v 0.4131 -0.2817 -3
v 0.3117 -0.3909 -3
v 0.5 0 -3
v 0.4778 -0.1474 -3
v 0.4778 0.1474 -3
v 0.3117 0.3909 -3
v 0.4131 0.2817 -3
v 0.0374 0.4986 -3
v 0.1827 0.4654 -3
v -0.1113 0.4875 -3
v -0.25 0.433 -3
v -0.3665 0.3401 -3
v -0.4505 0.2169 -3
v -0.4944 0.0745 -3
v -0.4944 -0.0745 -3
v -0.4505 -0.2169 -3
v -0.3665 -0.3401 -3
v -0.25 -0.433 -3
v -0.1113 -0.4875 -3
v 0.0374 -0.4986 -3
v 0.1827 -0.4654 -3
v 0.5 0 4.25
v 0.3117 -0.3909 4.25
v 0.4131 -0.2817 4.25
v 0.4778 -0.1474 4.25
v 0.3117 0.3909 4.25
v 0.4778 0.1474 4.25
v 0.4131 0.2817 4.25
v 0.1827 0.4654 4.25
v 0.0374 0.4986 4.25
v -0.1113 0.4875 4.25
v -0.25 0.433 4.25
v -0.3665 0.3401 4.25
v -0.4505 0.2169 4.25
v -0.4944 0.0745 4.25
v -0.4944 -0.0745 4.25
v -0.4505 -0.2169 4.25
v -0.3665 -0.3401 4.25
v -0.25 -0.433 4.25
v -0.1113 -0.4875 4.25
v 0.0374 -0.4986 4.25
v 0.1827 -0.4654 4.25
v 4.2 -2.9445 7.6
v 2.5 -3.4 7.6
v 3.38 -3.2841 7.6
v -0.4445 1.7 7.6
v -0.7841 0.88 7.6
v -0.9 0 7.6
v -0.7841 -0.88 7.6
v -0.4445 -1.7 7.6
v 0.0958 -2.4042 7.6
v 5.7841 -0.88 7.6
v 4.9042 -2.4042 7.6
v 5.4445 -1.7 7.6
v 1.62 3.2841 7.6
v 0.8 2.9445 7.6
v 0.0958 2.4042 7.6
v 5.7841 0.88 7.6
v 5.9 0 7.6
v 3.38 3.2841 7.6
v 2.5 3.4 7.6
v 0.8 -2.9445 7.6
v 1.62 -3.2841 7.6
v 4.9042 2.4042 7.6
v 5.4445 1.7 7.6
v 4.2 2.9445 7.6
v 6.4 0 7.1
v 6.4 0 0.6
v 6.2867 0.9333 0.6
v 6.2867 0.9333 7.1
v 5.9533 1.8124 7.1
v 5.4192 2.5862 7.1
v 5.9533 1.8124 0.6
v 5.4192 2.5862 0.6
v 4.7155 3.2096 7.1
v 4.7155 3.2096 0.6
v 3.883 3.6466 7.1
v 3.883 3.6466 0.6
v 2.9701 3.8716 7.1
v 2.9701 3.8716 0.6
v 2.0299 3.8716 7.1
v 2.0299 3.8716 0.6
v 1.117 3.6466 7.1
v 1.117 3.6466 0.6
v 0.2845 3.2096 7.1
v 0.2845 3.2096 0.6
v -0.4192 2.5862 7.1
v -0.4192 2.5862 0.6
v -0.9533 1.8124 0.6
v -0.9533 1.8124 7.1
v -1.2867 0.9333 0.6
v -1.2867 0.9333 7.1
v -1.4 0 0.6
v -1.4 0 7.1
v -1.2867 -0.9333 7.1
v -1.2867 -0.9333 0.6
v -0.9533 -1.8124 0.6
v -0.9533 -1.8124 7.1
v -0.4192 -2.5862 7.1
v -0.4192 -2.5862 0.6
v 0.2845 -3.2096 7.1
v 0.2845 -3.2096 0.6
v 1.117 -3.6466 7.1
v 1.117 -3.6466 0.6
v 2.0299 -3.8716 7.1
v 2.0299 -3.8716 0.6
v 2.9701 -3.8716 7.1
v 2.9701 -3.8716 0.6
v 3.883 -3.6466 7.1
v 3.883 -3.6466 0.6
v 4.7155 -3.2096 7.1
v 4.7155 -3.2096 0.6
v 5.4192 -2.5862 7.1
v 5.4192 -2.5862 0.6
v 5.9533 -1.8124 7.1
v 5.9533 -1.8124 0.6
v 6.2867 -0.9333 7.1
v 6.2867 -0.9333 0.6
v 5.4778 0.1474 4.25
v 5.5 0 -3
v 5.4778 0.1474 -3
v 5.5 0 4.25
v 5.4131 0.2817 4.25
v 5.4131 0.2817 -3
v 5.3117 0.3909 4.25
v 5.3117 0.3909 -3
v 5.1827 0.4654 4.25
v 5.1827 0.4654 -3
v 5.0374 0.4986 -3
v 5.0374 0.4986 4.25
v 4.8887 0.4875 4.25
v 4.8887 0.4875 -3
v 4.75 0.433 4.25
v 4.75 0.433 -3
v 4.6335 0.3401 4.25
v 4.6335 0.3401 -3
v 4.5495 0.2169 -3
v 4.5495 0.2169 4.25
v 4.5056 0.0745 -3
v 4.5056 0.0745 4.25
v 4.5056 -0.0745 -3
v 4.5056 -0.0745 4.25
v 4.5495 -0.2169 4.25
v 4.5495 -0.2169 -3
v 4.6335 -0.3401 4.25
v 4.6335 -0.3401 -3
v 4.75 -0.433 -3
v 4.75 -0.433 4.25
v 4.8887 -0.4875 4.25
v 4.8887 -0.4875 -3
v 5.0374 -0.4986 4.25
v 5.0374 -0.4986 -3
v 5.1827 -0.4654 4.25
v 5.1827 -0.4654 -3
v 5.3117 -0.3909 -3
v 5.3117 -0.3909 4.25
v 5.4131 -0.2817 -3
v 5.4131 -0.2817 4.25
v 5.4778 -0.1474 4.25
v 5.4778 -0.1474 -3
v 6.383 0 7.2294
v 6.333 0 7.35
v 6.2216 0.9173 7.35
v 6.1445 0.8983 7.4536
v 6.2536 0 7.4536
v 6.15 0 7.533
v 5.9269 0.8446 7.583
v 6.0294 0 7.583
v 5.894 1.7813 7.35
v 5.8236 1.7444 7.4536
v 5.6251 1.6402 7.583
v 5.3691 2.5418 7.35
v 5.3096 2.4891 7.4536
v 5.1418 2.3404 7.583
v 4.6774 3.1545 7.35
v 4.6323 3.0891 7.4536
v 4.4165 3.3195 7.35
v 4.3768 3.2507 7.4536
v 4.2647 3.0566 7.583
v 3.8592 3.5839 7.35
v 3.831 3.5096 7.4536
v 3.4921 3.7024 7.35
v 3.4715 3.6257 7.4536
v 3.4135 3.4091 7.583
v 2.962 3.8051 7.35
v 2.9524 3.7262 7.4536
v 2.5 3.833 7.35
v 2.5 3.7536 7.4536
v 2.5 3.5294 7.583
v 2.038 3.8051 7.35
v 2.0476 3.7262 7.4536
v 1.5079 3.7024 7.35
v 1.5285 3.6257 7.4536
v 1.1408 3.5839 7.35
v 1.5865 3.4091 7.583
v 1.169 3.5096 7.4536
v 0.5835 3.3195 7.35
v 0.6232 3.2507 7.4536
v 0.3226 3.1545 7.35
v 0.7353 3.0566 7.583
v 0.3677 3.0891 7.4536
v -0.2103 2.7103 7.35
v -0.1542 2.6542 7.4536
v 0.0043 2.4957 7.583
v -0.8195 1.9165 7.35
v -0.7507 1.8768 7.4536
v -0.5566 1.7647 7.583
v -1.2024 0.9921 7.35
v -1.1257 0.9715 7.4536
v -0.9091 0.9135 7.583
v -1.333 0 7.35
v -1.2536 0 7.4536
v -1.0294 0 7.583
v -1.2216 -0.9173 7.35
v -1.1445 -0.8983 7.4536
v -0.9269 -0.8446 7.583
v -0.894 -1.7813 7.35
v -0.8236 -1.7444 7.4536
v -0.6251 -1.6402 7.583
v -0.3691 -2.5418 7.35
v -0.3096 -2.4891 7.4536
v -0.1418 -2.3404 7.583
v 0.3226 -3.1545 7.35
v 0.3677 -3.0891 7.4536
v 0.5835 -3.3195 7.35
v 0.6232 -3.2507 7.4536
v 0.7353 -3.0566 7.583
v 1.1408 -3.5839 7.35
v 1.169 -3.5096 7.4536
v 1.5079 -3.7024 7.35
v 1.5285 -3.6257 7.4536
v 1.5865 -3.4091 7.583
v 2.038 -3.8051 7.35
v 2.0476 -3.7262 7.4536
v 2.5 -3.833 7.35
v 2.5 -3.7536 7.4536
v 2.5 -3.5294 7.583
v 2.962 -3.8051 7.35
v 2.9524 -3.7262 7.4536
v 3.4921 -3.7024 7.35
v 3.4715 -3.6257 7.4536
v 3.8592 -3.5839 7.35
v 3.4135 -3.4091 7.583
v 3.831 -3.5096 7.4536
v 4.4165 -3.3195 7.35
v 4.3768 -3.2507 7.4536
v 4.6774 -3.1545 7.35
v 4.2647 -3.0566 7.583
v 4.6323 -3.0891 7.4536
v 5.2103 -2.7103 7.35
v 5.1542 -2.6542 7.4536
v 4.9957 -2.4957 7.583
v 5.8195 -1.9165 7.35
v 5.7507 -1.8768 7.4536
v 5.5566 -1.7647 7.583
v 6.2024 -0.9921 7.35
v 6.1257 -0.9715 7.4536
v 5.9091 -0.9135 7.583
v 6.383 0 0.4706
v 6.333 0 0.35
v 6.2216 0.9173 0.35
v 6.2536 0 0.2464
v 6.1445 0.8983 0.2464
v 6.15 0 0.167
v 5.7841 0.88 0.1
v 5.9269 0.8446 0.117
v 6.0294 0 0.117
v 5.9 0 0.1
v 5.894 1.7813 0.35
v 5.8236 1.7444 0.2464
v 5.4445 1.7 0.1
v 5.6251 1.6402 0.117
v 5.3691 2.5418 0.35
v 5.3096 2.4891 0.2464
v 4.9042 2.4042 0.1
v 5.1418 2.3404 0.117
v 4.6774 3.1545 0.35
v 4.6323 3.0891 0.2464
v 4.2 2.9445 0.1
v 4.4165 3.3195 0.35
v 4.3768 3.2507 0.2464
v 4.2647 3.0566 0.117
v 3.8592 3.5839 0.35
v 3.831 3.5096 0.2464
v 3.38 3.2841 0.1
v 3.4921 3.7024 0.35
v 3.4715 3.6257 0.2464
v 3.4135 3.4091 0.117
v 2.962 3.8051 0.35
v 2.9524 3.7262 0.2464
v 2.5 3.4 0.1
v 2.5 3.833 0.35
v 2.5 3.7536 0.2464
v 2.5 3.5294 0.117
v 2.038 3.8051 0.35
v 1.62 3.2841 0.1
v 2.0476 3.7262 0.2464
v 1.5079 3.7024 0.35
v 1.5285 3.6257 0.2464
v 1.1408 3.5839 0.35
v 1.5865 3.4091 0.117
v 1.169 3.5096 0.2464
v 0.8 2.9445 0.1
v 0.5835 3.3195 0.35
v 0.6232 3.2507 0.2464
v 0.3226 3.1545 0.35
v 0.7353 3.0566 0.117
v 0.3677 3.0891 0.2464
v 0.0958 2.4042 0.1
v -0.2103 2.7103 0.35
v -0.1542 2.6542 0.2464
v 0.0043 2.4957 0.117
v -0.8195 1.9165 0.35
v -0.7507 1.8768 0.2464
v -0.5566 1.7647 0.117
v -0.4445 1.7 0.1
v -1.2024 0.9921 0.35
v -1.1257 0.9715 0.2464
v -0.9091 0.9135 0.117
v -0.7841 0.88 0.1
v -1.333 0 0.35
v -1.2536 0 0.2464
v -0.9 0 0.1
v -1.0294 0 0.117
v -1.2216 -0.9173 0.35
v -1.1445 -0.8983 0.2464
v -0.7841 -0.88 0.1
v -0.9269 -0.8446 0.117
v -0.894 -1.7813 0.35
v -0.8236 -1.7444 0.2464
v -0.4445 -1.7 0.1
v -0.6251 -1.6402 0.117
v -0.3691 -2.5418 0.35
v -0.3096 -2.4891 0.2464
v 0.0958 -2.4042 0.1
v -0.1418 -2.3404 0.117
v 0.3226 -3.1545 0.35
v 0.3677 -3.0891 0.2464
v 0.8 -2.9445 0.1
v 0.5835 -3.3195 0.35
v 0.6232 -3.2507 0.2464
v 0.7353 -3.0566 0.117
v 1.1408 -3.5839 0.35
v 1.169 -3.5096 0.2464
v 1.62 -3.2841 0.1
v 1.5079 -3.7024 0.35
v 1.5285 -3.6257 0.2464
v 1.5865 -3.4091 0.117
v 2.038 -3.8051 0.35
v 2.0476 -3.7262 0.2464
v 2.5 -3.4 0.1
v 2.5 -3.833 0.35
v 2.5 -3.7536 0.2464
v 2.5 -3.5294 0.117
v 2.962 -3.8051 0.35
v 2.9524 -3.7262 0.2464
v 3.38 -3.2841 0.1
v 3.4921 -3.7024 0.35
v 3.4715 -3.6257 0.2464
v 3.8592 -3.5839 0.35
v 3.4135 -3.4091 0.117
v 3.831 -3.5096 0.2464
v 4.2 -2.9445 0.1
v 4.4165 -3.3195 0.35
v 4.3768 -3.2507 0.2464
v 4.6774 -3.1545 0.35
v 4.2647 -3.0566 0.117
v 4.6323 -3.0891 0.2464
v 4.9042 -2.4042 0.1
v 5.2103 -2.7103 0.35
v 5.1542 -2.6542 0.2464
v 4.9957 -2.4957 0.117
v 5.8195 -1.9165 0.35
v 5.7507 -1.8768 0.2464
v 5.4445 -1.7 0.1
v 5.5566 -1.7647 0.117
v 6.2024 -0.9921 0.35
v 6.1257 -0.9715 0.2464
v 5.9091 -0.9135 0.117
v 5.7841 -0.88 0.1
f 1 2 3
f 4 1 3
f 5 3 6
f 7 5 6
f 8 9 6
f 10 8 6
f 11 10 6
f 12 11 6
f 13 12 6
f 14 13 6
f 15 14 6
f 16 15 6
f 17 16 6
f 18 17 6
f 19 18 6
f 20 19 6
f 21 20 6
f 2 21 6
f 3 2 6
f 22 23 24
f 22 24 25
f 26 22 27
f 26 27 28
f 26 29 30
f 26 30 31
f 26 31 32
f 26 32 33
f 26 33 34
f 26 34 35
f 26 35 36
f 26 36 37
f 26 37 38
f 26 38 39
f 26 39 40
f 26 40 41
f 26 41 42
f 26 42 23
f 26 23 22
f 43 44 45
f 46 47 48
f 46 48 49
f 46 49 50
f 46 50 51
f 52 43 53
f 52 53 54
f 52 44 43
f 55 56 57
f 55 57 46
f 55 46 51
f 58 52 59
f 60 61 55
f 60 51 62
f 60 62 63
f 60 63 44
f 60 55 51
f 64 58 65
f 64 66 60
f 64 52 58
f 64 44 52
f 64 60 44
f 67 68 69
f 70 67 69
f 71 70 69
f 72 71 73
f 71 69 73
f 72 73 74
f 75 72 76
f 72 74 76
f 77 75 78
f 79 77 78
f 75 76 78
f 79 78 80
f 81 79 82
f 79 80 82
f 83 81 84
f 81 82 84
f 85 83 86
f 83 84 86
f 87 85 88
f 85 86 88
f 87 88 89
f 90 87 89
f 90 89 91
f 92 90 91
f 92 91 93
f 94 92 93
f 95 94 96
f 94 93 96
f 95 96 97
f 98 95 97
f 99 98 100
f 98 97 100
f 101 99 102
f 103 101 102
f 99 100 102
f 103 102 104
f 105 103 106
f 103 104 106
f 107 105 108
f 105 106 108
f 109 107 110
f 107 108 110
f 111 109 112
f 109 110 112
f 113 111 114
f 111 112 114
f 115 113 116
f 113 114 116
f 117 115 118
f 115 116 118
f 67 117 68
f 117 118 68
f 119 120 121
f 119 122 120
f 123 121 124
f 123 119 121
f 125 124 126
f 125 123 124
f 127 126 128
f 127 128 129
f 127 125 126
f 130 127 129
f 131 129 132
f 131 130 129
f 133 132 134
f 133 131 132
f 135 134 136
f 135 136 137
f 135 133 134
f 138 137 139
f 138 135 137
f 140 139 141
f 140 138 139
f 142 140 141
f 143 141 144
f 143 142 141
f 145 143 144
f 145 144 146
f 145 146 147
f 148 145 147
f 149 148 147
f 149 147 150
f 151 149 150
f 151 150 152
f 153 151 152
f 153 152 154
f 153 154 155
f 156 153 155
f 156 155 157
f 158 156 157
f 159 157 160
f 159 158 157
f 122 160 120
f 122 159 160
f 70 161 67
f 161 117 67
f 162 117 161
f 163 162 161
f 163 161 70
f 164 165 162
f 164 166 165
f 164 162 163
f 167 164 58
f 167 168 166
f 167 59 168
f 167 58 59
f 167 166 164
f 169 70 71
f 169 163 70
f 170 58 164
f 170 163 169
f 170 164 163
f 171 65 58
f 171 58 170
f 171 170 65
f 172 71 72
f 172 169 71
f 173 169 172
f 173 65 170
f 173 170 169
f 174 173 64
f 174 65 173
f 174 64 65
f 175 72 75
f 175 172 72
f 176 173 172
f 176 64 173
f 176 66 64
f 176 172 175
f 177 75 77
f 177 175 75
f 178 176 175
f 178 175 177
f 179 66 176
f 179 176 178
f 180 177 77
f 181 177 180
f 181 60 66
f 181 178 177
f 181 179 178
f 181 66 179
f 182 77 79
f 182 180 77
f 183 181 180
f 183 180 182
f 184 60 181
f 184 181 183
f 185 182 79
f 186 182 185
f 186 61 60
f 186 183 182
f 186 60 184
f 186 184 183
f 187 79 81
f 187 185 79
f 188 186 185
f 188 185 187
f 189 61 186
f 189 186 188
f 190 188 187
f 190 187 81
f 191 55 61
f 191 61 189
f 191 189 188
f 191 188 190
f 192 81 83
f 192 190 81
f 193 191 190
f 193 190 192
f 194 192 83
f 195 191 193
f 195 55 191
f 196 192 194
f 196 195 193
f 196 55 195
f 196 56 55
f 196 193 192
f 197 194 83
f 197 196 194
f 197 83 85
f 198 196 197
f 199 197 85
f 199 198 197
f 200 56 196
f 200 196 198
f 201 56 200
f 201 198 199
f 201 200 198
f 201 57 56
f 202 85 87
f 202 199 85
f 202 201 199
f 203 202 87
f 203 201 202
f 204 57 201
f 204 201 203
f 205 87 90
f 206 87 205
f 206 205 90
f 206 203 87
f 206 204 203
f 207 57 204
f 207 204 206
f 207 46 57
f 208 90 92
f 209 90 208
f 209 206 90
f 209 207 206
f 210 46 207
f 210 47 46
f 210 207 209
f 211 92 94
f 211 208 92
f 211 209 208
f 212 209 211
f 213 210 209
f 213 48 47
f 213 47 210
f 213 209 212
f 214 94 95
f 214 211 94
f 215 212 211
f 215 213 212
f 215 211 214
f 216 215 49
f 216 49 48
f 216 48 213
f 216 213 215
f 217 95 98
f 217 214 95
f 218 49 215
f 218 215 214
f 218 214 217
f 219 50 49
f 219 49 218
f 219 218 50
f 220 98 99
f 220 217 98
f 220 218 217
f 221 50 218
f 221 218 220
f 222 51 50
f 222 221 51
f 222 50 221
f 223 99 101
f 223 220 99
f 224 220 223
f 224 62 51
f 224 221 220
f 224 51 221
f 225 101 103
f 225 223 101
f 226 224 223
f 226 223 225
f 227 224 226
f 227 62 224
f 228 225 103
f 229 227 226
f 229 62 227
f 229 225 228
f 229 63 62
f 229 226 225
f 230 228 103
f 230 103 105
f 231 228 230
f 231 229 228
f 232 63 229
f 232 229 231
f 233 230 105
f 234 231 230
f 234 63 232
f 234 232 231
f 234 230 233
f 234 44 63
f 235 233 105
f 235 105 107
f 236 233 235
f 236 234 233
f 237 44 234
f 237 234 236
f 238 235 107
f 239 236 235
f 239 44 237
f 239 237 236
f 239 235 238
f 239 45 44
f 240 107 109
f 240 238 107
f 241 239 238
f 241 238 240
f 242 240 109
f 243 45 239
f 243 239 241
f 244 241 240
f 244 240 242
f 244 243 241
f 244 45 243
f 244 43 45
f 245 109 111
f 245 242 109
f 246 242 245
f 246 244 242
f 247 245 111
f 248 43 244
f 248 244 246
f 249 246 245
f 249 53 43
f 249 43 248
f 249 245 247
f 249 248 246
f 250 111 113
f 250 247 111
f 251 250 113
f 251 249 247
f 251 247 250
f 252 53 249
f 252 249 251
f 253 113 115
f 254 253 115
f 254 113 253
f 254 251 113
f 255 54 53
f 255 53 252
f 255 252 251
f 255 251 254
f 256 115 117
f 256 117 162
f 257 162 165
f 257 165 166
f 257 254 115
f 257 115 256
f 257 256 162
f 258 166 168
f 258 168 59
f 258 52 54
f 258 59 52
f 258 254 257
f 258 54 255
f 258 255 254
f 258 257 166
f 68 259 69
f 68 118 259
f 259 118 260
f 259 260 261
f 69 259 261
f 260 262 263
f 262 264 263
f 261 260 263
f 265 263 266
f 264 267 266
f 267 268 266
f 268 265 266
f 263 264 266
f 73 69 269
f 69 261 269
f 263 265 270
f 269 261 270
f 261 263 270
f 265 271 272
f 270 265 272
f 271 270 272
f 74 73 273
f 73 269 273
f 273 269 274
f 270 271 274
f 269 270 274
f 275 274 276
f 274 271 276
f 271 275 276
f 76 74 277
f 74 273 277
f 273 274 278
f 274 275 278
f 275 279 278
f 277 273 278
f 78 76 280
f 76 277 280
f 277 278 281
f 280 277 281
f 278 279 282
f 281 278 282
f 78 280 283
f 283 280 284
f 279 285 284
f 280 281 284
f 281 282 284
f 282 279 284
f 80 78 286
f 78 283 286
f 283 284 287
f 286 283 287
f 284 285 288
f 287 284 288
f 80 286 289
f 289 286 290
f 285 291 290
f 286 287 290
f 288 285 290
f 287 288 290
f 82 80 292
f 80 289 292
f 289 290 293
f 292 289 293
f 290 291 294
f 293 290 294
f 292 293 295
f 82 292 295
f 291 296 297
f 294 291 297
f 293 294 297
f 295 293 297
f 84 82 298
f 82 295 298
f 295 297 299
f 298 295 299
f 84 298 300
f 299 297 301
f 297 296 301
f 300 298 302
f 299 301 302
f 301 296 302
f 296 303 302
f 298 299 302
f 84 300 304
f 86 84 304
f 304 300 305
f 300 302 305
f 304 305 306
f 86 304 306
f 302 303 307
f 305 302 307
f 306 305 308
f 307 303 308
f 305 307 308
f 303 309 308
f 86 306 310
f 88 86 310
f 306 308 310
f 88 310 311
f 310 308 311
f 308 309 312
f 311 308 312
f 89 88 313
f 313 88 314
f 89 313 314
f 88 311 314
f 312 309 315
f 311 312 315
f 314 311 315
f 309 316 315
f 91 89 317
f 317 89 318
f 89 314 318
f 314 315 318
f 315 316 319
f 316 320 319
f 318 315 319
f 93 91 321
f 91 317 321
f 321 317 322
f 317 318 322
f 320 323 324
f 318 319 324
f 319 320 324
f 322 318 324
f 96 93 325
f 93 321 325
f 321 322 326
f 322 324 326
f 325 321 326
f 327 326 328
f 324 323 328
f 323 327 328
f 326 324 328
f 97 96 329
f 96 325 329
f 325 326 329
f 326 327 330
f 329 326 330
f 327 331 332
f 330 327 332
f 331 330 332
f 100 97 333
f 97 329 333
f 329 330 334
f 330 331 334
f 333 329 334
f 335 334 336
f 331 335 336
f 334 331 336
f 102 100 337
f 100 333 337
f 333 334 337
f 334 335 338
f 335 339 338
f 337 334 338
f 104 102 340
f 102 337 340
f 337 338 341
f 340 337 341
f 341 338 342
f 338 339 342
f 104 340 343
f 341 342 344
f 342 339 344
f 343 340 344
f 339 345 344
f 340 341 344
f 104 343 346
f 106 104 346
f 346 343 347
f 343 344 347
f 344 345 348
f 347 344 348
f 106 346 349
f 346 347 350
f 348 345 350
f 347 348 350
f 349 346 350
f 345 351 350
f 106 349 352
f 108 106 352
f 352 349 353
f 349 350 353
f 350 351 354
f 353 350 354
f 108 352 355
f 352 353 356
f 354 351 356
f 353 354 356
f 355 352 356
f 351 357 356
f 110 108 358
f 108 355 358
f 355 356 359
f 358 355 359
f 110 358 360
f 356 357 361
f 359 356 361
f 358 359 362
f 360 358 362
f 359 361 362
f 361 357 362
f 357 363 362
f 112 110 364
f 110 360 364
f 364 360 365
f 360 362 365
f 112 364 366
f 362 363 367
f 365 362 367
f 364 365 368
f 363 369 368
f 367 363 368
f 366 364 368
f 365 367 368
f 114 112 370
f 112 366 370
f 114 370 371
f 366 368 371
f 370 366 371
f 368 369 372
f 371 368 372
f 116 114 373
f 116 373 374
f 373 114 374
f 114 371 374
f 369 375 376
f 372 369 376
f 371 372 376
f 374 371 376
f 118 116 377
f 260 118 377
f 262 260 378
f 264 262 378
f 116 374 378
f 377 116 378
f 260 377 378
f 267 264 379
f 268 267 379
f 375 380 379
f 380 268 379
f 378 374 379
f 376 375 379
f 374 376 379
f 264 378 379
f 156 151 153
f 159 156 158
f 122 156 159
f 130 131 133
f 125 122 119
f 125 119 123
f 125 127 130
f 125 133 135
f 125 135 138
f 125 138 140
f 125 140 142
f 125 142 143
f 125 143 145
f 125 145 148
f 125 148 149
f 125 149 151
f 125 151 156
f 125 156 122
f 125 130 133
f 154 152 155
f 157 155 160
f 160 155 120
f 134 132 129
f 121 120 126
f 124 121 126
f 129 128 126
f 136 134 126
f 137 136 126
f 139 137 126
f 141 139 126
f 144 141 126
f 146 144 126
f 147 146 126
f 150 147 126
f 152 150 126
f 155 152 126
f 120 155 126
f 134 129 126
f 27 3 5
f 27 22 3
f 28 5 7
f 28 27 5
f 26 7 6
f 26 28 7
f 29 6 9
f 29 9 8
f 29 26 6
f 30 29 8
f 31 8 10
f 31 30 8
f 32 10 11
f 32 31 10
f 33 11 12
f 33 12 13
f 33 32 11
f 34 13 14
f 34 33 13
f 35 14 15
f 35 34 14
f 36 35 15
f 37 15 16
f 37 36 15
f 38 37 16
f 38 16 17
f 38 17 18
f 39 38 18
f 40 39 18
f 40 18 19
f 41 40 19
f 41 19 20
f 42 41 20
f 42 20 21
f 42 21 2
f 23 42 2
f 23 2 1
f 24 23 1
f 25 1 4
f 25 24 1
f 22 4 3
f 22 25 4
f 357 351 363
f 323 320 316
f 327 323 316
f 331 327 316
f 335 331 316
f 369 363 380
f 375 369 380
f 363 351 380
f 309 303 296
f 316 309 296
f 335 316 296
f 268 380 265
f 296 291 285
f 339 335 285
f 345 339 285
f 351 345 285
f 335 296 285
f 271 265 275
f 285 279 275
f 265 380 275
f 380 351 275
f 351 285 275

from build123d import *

# Parameters (mm, degrees)
SKETCH001_R       = 0.5
PAD001_DEPTH      = 3.75
PAD001_DEPTH_BACK = 3.5
SKETCH_R          = 3.9
PAD_DEPTH         = 7.5
FILLET_R          = 0.5


with BuildPart() as pad001:
    # Sketch001 → Pad001 (new body, two sides)
    with BuildSketch(Plane.XY.offset(0.5)) as pad001_sk:
        Circle(SKETCH001_R)
        with Locations((5, 0)):
            Circle(SKETCH001_R)
    extrude(amount=PAD001_DEPTH)
    extrude(pad001_sk.sketch, amount=-PAD001_DEPTH_BACK)


with BuildPart() as fillet_body:
    # Sketch → Pad (new body)
    with BuildSketch(Plane.XY.offset(0.1)):
        with Locations((2.5, 0)):
            Circle(SKETCH_R)
    extrude(amount=PAD_DEPTH)

    # Fillet
    fillet_edges = [fillet_body.edges().sort_by_distance(p)[0] for p in [
        (-1.4, 0, 0.1),
        (-1.4, 0, 7.6),
    ]]
    fillet(fillet_edges, radius=FILLET_R)


solid = Compound([pad001.part, fillet_body.part])
